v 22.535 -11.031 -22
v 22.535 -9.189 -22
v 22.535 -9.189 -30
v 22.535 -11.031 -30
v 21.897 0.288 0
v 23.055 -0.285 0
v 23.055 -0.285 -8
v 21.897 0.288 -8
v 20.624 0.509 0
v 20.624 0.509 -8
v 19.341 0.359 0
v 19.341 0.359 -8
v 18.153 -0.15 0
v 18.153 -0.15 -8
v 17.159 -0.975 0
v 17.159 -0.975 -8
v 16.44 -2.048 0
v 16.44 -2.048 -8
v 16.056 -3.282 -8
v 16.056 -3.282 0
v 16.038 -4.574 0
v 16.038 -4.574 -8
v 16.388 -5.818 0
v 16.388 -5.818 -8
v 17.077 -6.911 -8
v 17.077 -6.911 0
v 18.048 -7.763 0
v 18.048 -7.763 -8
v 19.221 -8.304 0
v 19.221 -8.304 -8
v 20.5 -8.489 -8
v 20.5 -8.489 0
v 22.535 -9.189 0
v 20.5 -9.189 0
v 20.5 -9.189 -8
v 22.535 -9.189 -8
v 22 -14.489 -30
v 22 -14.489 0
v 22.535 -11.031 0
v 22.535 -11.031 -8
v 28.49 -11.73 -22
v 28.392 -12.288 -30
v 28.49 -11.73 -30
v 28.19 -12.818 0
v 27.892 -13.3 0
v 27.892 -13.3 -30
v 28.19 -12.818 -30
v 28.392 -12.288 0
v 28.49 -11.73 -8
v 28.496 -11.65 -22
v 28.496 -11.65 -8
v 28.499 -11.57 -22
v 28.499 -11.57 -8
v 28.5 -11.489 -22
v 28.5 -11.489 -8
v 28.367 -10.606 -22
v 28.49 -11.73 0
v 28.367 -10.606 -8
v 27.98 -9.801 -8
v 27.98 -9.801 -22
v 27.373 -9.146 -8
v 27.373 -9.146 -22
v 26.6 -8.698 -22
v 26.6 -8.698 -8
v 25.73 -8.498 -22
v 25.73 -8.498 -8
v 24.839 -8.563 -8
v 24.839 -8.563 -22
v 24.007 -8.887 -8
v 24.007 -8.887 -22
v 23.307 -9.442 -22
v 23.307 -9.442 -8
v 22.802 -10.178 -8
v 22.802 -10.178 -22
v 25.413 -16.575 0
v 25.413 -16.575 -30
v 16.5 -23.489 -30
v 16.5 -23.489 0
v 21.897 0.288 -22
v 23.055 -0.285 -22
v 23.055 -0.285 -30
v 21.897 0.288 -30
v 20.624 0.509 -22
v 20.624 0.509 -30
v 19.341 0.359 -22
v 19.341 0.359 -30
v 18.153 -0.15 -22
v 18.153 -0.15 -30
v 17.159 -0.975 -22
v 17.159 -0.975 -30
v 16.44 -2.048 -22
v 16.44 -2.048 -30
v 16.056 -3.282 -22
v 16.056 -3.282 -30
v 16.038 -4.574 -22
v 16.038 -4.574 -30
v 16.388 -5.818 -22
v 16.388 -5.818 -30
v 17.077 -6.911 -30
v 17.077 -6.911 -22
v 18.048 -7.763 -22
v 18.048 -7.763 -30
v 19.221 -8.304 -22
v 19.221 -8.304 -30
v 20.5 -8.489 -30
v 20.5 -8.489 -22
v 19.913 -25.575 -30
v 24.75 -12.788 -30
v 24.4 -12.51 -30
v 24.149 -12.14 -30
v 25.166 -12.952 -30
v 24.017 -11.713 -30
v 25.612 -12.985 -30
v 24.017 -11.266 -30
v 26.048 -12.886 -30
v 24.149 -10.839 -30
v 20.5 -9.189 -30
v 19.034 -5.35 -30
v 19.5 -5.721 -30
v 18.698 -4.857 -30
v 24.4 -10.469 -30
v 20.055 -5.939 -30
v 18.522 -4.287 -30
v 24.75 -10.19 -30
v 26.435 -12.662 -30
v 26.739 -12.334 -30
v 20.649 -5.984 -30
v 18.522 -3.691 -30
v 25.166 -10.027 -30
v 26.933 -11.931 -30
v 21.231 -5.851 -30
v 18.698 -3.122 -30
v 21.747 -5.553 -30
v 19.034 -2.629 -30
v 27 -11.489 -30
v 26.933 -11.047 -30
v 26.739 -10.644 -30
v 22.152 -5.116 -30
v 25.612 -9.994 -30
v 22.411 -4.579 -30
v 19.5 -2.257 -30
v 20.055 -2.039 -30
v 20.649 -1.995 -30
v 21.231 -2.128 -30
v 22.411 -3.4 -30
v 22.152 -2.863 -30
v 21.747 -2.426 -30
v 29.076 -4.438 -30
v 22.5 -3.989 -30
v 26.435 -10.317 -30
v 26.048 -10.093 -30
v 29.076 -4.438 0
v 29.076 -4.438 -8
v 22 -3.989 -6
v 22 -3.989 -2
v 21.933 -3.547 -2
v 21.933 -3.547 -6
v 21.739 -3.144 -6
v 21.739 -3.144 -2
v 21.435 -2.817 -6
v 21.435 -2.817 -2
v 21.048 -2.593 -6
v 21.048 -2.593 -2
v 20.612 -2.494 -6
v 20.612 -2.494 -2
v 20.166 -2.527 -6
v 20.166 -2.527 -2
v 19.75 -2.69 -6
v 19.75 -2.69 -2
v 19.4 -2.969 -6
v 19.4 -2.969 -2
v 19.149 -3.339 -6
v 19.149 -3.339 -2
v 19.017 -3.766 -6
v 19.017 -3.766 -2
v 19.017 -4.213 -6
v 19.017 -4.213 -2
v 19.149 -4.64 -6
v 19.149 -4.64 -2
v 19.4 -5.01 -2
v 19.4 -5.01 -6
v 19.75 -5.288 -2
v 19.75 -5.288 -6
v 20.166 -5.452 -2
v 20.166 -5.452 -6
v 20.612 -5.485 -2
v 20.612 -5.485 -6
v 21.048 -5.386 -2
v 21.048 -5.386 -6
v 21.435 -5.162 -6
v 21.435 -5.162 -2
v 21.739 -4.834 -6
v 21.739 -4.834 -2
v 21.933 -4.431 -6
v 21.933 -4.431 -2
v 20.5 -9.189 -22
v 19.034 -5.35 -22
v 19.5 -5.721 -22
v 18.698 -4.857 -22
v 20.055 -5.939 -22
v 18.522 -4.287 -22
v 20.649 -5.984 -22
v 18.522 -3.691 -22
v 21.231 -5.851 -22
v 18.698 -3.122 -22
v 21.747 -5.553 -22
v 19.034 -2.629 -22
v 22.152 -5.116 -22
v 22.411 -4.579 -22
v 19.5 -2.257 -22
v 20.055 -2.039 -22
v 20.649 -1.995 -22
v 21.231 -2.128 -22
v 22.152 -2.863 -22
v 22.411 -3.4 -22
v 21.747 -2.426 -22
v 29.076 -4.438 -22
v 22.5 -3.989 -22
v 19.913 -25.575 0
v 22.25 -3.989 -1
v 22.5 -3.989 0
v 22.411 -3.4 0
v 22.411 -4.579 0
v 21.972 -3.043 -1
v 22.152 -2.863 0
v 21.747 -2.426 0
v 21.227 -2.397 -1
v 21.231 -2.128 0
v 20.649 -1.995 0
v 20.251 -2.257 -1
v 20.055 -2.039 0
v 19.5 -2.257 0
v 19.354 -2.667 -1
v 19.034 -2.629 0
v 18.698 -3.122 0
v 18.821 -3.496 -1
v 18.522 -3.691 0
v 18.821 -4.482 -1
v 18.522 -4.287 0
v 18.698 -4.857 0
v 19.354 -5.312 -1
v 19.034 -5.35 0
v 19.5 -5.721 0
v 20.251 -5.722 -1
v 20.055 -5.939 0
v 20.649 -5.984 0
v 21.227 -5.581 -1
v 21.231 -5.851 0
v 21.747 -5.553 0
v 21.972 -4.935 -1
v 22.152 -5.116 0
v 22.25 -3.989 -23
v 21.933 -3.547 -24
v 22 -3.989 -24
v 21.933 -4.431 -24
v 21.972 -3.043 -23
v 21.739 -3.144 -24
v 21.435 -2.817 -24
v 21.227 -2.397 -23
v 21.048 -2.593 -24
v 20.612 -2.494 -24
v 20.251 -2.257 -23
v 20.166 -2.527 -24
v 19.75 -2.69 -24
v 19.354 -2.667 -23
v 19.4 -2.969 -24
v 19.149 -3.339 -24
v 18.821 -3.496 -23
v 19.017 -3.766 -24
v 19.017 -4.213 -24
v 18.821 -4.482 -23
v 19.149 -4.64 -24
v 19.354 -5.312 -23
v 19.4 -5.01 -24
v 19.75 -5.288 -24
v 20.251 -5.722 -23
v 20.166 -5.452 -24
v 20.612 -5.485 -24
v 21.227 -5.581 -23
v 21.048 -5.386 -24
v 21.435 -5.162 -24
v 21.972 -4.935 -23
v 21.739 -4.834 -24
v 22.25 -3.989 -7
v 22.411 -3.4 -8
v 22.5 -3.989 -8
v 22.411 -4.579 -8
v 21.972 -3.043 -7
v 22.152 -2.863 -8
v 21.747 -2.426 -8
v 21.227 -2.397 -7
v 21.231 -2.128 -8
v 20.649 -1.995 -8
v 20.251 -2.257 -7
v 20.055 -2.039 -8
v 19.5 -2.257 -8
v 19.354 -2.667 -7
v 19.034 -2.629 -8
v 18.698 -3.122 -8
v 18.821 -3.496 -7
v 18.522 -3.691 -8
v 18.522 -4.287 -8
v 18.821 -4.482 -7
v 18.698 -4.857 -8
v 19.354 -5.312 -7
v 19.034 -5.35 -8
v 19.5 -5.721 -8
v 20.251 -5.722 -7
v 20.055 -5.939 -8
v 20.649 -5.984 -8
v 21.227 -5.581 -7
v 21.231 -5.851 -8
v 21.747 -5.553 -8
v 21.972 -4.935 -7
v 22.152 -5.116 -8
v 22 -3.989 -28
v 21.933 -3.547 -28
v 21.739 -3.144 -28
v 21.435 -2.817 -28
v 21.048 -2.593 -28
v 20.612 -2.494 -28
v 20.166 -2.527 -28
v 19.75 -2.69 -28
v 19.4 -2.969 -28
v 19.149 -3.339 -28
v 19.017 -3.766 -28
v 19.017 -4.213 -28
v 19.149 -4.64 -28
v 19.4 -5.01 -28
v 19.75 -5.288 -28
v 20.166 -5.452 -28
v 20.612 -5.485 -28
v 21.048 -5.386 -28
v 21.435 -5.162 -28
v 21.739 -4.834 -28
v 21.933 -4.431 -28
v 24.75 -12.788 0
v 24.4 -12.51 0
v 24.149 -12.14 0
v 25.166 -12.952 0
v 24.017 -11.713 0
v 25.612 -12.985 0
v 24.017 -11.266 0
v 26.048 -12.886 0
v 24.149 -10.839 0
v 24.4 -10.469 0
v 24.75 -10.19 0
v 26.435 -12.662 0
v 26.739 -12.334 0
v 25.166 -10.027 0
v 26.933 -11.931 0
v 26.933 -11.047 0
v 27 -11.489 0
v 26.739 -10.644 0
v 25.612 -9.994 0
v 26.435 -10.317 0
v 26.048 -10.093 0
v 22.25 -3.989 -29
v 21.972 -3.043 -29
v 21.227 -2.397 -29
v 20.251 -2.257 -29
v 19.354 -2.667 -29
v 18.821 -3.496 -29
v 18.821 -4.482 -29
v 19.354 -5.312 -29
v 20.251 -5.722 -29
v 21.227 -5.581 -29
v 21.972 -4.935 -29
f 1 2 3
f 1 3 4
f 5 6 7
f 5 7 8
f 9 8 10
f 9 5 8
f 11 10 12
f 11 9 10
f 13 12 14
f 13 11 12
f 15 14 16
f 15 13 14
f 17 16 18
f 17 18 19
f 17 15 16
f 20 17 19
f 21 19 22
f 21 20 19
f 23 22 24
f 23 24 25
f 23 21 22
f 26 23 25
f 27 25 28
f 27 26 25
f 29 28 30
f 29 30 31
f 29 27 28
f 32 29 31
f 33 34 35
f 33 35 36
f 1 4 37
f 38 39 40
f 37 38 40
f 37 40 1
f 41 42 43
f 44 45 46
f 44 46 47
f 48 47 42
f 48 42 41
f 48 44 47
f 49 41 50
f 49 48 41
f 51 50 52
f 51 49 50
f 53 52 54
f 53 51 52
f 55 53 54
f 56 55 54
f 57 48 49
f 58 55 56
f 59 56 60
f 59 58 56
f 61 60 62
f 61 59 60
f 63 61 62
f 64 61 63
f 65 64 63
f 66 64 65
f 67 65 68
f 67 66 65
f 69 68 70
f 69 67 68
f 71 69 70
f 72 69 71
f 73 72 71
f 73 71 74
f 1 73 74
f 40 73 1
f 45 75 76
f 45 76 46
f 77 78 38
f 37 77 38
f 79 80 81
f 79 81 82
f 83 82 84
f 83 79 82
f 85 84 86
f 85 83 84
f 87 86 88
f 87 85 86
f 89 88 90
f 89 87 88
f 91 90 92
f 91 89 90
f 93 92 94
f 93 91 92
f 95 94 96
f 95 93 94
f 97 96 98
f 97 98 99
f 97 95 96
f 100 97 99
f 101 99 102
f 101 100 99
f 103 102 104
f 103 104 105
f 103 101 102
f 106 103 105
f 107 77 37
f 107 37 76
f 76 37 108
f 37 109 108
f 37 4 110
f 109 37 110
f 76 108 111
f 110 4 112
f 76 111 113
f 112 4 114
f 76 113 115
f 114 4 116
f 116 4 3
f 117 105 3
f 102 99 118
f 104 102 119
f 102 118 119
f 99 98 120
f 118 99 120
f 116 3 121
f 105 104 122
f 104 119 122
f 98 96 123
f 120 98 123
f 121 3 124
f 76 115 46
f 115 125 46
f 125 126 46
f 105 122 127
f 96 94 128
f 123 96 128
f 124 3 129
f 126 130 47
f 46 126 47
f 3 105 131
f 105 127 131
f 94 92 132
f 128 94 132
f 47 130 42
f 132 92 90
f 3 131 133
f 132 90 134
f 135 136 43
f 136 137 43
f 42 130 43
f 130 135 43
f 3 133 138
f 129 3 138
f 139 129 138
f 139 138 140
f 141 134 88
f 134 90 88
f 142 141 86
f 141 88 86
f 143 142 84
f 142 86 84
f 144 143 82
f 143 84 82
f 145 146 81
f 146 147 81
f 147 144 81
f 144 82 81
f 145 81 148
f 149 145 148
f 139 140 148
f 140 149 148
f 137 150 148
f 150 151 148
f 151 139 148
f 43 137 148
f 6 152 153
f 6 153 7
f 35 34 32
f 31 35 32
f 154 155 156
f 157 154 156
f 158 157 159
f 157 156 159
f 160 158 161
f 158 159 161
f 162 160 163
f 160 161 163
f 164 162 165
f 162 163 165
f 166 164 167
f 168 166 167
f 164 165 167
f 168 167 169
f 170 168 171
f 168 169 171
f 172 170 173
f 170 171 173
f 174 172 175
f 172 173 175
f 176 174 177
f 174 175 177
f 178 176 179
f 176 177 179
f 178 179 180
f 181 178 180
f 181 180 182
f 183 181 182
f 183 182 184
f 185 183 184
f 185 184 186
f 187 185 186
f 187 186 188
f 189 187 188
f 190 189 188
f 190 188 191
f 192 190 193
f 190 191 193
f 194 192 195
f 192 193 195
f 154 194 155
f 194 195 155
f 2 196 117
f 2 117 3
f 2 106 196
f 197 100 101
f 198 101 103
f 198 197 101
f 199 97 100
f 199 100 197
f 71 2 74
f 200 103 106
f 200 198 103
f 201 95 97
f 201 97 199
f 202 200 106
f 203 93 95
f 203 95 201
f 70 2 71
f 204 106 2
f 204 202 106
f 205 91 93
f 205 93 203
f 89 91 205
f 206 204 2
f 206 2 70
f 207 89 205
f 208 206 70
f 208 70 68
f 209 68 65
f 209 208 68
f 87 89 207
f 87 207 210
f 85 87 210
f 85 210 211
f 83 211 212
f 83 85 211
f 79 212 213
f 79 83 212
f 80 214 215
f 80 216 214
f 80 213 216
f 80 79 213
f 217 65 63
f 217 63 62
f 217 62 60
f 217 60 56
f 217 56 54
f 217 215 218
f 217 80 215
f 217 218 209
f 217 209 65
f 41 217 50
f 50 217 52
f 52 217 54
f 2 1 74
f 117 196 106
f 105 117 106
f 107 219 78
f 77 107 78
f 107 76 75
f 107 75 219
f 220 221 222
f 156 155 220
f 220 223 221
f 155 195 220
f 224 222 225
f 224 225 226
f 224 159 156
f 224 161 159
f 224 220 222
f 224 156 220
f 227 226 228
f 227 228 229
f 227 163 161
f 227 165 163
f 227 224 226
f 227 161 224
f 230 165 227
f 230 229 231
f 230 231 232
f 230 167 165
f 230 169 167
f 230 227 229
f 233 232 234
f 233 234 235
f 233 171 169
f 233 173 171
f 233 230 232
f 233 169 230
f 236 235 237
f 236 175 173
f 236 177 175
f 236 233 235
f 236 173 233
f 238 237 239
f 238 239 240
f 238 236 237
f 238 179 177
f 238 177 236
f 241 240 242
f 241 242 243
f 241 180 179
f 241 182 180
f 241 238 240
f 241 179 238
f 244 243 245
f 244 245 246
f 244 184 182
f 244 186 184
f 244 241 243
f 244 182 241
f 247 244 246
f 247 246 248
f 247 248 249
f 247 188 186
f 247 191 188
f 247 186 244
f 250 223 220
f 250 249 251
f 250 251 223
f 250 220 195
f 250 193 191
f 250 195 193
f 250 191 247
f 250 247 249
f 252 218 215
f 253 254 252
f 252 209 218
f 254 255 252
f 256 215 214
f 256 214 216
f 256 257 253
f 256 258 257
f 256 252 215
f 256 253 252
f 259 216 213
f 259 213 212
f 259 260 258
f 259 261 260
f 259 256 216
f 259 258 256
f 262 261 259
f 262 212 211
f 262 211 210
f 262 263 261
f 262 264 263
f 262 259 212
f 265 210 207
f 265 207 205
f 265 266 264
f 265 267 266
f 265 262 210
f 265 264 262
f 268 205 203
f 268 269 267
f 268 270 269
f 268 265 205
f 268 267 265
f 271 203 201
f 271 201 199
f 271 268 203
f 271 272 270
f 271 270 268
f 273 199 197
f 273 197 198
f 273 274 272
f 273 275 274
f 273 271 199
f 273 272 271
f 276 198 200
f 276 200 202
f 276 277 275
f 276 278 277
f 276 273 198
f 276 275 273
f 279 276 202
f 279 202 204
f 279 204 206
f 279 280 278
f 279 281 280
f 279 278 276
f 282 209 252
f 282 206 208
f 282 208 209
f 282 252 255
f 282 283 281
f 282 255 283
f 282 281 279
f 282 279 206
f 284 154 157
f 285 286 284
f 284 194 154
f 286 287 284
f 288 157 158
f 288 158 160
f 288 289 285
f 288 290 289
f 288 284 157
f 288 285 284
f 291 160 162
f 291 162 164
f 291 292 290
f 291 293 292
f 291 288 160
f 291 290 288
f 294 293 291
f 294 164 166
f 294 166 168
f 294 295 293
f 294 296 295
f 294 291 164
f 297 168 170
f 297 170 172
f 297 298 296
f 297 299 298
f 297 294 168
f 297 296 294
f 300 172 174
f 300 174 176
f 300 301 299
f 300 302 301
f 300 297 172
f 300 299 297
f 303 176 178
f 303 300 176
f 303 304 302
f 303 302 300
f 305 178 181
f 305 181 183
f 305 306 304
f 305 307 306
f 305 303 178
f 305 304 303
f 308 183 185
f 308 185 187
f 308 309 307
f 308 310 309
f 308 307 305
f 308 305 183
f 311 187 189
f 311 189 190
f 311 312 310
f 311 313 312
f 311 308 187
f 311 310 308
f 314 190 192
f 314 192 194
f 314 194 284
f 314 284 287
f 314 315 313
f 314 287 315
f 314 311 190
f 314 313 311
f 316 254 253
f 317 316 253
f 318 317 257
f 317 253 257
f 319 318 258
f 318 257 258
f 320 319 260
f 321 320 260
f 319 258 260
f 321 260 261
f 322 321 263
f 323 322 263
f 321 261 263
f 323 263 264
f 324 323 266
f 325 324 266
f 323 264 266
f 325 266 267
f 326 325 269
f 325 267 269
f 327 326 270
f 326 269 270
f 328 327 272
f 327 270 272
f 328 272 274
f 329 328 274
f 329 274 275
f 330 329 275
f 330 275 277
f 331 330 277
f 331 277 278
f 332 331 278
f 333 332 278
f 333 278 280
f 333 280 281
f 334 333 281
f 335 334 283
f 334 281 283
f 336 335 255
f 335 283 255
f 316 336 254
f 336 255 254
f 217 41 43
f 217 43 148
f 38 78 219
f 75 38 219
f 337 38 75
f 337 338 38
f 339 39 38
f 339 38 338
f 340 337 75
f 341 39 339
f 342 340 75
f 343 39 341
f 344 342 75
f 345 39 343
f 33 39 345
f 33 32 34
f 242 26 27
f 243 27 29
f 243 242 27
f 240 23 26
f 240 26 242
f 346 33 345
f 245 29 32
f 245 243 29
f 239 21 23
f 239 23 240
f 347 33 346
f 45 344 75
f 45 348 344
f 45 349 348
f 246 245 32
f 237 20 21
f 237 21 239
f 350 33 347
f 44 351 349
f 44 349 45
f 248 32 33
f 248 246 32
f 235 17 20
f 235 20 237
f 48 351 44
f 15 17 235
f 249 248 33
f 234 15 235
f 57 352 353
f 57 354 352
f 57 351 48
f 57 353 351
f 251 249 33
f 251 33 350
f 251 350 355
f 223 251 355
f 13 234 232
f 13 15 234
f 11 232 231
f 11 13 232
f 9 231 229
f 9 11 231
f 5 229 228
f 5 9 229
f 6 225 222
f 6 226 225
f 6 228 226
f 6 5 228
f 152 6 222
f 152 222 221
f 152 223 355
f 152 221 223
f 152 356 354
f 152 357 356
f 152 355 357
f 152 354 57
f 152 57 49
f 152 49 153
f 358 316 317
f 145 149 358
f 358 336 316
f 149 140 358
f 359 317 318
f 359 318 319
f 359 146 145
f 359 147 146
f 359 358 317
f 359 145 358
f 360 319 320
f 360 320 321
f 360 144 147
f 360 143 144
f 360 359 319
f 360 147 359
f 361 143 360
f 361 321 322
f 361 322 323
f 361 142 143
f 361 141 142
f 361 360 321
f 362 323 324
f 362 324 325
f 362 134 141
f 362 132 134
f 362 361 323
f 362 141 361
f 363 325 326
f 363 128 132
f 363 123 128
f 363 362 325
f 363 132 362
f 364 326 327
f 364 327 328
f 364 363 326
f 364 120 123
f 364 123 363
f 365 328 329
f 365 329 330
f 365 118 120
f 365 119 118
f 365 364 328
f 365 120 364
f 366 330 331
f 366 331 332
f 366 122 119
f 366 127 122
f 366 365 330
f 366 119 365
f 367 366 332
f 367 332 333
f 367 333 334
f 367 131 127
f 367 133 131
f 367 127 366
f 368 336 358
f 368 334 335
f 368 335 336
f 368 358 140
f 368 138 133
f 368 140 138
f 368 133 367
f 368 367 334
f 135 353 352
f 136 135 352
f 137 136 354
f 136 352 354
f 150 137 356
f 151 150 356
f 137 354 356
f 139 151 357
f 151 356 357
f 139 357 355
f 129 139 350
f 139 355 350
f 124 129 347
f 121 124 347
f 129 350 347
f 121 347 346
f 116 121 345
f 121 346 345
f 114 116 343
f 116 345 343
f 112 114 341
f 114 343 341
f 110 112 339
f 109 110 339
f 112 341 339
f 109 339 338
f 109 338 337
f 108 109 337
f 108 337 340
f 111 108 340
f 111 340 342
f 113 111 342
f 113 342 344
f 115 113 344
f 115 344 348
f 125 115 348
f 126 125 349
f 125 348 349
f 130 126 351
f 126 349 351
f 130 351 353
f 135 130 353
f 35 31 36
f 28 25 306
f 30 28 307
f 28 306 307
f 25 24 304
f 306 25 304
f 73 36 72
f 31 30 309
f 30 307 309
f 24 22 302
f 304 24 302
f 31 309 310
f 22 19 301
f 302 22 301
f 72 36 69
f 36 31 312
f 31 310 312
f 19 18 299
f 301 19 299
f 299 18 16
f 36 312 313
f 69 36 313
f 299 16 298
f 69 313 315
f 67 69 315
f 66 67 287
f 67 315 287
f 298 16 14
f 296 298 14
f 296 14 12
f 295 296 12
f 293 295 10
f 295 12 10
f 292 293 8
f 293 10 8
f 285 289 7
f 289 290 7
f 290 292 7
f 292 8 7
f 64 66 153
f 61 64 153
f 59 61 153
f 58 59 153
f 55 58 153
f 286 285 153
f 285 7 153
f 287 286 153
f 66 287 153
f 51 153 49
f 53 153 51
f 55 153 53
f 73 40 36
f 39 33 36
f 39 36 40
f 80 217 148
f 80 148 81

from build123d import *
from OCP.BRepFilletAPI import BRepFilletAPI_MakeChamfer

# Parameters (mm, degrees)
SKETCH1_R           = 3
SKETCH1_R_2         = 1.5
BOSS_EXTRUDE1_DEPTH = 30
SKETCH1_5_R         = 4.5
SKETCH1_5_R_2       = 1.5
SKETCH1_5_W         = 2.035294118
SKETCH1_5_H         = 0.7
BOSS_EXTRUDE2_DEPTH = 8
LPATTERN1_COUNT     = 2
LPATTERN1_PITCH     = 22
CHAMFER1_SIZE       = 0.5
CHAMFER1_SIZE2      = 2
CHAMFER2_SIZE       = 2
CHAMFER2_SIZE2      = 0.5
CHAMFER3_SIZE       = 2
CHAMFER3_SIZE2      = 0.5


with BuildPart() as part:
    # Sketch1 → Boss-Extrude1 (new body)
    # profile 1 of 3: a face of its own
    with BuildSketch(Plane.XY):
        Polygon((22, -14.489354466), (25.413127335, -16.575154503), (19.913127335, -25.575154503), (16.5, -23.489354466), align=None)
    # profile 2 of 3: a face of its own
    with BuildSketch(Plane.XY):
        with BuildLine():
            Line((22.535294118, -11.030530936), (22, -14.489354466))
            Line((22, -14.489354466), (25.413127335, -16.575154503))
            Line((25.413127335, -16.575154503), (27.892093962, -13.2998479))
            ThreePointArc((27.892093962, -13.2998479), (24.329777383, -14.251704738), (22.535294118, -11.030530936))
        make_face()
    # profile 3 of 3: a face of its own
    with BuildSketch(Plane.XY):
        with Locations((25.5, -11.489354466)):
            Circle(SKETCH1_R)
        with Locations((25.5, -11.489354466)):
            Circle(SKETCH1_R_2, mode=Mode.SUBTRACT)
    extrude(amount=-BOSS_EXTRUDE1_DEPTH)

    # Sketch1<5> → Boss-Extrude2 (add)
    # profile 1 of 3: a face of its own
    with BuildSketch(Plane.XY):
        with BuildLine():
            Line((22.535294118, -9.189354466), (22.535294118, -11.030530936))
            ThreePointArc((22.535294118, -11.030530936), (25.730089497, -8.498191009), (28.5, -11.489354466))
            ThreePointArc((28.5, -11.489354466), (28.497587401, -11.609644848), (28.490353483, -11.729741755))
            Line((28.490353483, -11.729741755), (29.076489945, -4.438361169))
            Line((29.076489945, -4.438361169), (23.055037361, -0.285061809))
            ThreePointArc((23.055037361, -0.285061809), (24.484198045, -1.897425705), (25, -3.989354466))
            ThreePointArc((25, -3.989354466), (23.681980515, -7.171334981), (20.5, -8.489354466))
            Line((20.5, -8.489354466), (22.535294118, -8.489354466))
            Line((22.535294118, -8.489354466), (22.535294118, -9.189354466))
        make_face()
    # profile 2 of 3: a face of its own
    with BuildSketch(Plane.XY):
        with Locations((20.5, -3.989354466)):
            Circle(SKETCH1_5_R)
        with Locations((20.5, -3.989354466)):
            Circle(SKETCH1_5_R_2, mode=Mode.SUBTRACT)
    # profile 3 of 3: a face of its own
    with BuildSketch(Plane.XY):
        with Locations((21.517647059, -8.839354466)):
            Rectangle(SKETCH1_5_W, SKETCH1_5_H)
    boss_extrude2 = extrude(amount=-BOSS_EXTRUDE2_DEPTH)

    # LPattern1: Boss-Extrude2 ×2
    with Locations(*[(0, 0, -i * LPATTERN1_PITCH) for i in range(1, LPATTERN1_COUNT)]):
        add(boss_extrude2)

    # Chamfer1: one chamfer whose edges measure the first distance from different faces: ONE call of the kernel's chamfer builder (chamfer() names one face for all edges)
    chamfer1_edges_1 = [part.edges().sort_by_distance(p)[0] for p in [
        (19, -3.989354466, 0),
    ]]
    chamfer1_side_1 = [part.faces().sort_by_distance(p)[0] for p in [
        (22.584533606, -10.229298643, 0),
    ]]
    chamfer1_edges_2 = [part.edges().sort_by_distance(p)[0] for p in [
        (19, -3.989354466, -22),
    ]]
    chamfer1_side_2 = [part.faces().sort_by_distance(p)[0] for p in [
        (22.505894665, -4.865120782, -22),
    ]]
    chamfer1 = BRepFilletAPI_MakeChamfer(part.part.solid().wrapped)
    for e in chamfer1_edges_1:
        chamfer1.Add(CHAMFER1_SIZE, CHAMFER1_SIZE2, e.wrapped, chamfer1_side_1[0].wrapped)  # the first distance lies on this face
    for e in chamfer1_edges_2:
        chamfer1.Add(CHAMFER1_SIZE, CHAMFER1_SIZE2, e.wrapped, chamfer1_side_2[0].wrapped)  # the first distance lies on this face
    add(Compound.cast(chamfer1.Shape()), mode=Mode.REPLACE)

    # Chamfer2
    chamfer2_edges = [part.edges().sort_by_distance(p)[0] for p in [
        (19, -3.989354466, -8),
    ]]
    chamfer2_side = [part.faces().sort_by_distance(p)[0] for p in [
        (19, -3.989354466, -5),
    ]]
    chamfer(chamfer2_edges, length=CHAMFER2_SIZE, length2=CHAMFER2_SIZE2, reference=chamfer2_side[0])

    # Chamfer3
    chamfer3_edges = [part.edges().sort_by_distance(p)[0] for p in [
        (19, -3.989354466, -30),
    ]]
    chamfer3_side = [part.faces().sort_by_distance(p)[0] for p in [
        (19, -3.989354466, -27),
    ]]
    chamfer(chamfer3_edges, length=CHAMFER3_SIZE, length2=CHAMFER3_SIZE2, reference=chamfer3_side[0])


solid = part.part
